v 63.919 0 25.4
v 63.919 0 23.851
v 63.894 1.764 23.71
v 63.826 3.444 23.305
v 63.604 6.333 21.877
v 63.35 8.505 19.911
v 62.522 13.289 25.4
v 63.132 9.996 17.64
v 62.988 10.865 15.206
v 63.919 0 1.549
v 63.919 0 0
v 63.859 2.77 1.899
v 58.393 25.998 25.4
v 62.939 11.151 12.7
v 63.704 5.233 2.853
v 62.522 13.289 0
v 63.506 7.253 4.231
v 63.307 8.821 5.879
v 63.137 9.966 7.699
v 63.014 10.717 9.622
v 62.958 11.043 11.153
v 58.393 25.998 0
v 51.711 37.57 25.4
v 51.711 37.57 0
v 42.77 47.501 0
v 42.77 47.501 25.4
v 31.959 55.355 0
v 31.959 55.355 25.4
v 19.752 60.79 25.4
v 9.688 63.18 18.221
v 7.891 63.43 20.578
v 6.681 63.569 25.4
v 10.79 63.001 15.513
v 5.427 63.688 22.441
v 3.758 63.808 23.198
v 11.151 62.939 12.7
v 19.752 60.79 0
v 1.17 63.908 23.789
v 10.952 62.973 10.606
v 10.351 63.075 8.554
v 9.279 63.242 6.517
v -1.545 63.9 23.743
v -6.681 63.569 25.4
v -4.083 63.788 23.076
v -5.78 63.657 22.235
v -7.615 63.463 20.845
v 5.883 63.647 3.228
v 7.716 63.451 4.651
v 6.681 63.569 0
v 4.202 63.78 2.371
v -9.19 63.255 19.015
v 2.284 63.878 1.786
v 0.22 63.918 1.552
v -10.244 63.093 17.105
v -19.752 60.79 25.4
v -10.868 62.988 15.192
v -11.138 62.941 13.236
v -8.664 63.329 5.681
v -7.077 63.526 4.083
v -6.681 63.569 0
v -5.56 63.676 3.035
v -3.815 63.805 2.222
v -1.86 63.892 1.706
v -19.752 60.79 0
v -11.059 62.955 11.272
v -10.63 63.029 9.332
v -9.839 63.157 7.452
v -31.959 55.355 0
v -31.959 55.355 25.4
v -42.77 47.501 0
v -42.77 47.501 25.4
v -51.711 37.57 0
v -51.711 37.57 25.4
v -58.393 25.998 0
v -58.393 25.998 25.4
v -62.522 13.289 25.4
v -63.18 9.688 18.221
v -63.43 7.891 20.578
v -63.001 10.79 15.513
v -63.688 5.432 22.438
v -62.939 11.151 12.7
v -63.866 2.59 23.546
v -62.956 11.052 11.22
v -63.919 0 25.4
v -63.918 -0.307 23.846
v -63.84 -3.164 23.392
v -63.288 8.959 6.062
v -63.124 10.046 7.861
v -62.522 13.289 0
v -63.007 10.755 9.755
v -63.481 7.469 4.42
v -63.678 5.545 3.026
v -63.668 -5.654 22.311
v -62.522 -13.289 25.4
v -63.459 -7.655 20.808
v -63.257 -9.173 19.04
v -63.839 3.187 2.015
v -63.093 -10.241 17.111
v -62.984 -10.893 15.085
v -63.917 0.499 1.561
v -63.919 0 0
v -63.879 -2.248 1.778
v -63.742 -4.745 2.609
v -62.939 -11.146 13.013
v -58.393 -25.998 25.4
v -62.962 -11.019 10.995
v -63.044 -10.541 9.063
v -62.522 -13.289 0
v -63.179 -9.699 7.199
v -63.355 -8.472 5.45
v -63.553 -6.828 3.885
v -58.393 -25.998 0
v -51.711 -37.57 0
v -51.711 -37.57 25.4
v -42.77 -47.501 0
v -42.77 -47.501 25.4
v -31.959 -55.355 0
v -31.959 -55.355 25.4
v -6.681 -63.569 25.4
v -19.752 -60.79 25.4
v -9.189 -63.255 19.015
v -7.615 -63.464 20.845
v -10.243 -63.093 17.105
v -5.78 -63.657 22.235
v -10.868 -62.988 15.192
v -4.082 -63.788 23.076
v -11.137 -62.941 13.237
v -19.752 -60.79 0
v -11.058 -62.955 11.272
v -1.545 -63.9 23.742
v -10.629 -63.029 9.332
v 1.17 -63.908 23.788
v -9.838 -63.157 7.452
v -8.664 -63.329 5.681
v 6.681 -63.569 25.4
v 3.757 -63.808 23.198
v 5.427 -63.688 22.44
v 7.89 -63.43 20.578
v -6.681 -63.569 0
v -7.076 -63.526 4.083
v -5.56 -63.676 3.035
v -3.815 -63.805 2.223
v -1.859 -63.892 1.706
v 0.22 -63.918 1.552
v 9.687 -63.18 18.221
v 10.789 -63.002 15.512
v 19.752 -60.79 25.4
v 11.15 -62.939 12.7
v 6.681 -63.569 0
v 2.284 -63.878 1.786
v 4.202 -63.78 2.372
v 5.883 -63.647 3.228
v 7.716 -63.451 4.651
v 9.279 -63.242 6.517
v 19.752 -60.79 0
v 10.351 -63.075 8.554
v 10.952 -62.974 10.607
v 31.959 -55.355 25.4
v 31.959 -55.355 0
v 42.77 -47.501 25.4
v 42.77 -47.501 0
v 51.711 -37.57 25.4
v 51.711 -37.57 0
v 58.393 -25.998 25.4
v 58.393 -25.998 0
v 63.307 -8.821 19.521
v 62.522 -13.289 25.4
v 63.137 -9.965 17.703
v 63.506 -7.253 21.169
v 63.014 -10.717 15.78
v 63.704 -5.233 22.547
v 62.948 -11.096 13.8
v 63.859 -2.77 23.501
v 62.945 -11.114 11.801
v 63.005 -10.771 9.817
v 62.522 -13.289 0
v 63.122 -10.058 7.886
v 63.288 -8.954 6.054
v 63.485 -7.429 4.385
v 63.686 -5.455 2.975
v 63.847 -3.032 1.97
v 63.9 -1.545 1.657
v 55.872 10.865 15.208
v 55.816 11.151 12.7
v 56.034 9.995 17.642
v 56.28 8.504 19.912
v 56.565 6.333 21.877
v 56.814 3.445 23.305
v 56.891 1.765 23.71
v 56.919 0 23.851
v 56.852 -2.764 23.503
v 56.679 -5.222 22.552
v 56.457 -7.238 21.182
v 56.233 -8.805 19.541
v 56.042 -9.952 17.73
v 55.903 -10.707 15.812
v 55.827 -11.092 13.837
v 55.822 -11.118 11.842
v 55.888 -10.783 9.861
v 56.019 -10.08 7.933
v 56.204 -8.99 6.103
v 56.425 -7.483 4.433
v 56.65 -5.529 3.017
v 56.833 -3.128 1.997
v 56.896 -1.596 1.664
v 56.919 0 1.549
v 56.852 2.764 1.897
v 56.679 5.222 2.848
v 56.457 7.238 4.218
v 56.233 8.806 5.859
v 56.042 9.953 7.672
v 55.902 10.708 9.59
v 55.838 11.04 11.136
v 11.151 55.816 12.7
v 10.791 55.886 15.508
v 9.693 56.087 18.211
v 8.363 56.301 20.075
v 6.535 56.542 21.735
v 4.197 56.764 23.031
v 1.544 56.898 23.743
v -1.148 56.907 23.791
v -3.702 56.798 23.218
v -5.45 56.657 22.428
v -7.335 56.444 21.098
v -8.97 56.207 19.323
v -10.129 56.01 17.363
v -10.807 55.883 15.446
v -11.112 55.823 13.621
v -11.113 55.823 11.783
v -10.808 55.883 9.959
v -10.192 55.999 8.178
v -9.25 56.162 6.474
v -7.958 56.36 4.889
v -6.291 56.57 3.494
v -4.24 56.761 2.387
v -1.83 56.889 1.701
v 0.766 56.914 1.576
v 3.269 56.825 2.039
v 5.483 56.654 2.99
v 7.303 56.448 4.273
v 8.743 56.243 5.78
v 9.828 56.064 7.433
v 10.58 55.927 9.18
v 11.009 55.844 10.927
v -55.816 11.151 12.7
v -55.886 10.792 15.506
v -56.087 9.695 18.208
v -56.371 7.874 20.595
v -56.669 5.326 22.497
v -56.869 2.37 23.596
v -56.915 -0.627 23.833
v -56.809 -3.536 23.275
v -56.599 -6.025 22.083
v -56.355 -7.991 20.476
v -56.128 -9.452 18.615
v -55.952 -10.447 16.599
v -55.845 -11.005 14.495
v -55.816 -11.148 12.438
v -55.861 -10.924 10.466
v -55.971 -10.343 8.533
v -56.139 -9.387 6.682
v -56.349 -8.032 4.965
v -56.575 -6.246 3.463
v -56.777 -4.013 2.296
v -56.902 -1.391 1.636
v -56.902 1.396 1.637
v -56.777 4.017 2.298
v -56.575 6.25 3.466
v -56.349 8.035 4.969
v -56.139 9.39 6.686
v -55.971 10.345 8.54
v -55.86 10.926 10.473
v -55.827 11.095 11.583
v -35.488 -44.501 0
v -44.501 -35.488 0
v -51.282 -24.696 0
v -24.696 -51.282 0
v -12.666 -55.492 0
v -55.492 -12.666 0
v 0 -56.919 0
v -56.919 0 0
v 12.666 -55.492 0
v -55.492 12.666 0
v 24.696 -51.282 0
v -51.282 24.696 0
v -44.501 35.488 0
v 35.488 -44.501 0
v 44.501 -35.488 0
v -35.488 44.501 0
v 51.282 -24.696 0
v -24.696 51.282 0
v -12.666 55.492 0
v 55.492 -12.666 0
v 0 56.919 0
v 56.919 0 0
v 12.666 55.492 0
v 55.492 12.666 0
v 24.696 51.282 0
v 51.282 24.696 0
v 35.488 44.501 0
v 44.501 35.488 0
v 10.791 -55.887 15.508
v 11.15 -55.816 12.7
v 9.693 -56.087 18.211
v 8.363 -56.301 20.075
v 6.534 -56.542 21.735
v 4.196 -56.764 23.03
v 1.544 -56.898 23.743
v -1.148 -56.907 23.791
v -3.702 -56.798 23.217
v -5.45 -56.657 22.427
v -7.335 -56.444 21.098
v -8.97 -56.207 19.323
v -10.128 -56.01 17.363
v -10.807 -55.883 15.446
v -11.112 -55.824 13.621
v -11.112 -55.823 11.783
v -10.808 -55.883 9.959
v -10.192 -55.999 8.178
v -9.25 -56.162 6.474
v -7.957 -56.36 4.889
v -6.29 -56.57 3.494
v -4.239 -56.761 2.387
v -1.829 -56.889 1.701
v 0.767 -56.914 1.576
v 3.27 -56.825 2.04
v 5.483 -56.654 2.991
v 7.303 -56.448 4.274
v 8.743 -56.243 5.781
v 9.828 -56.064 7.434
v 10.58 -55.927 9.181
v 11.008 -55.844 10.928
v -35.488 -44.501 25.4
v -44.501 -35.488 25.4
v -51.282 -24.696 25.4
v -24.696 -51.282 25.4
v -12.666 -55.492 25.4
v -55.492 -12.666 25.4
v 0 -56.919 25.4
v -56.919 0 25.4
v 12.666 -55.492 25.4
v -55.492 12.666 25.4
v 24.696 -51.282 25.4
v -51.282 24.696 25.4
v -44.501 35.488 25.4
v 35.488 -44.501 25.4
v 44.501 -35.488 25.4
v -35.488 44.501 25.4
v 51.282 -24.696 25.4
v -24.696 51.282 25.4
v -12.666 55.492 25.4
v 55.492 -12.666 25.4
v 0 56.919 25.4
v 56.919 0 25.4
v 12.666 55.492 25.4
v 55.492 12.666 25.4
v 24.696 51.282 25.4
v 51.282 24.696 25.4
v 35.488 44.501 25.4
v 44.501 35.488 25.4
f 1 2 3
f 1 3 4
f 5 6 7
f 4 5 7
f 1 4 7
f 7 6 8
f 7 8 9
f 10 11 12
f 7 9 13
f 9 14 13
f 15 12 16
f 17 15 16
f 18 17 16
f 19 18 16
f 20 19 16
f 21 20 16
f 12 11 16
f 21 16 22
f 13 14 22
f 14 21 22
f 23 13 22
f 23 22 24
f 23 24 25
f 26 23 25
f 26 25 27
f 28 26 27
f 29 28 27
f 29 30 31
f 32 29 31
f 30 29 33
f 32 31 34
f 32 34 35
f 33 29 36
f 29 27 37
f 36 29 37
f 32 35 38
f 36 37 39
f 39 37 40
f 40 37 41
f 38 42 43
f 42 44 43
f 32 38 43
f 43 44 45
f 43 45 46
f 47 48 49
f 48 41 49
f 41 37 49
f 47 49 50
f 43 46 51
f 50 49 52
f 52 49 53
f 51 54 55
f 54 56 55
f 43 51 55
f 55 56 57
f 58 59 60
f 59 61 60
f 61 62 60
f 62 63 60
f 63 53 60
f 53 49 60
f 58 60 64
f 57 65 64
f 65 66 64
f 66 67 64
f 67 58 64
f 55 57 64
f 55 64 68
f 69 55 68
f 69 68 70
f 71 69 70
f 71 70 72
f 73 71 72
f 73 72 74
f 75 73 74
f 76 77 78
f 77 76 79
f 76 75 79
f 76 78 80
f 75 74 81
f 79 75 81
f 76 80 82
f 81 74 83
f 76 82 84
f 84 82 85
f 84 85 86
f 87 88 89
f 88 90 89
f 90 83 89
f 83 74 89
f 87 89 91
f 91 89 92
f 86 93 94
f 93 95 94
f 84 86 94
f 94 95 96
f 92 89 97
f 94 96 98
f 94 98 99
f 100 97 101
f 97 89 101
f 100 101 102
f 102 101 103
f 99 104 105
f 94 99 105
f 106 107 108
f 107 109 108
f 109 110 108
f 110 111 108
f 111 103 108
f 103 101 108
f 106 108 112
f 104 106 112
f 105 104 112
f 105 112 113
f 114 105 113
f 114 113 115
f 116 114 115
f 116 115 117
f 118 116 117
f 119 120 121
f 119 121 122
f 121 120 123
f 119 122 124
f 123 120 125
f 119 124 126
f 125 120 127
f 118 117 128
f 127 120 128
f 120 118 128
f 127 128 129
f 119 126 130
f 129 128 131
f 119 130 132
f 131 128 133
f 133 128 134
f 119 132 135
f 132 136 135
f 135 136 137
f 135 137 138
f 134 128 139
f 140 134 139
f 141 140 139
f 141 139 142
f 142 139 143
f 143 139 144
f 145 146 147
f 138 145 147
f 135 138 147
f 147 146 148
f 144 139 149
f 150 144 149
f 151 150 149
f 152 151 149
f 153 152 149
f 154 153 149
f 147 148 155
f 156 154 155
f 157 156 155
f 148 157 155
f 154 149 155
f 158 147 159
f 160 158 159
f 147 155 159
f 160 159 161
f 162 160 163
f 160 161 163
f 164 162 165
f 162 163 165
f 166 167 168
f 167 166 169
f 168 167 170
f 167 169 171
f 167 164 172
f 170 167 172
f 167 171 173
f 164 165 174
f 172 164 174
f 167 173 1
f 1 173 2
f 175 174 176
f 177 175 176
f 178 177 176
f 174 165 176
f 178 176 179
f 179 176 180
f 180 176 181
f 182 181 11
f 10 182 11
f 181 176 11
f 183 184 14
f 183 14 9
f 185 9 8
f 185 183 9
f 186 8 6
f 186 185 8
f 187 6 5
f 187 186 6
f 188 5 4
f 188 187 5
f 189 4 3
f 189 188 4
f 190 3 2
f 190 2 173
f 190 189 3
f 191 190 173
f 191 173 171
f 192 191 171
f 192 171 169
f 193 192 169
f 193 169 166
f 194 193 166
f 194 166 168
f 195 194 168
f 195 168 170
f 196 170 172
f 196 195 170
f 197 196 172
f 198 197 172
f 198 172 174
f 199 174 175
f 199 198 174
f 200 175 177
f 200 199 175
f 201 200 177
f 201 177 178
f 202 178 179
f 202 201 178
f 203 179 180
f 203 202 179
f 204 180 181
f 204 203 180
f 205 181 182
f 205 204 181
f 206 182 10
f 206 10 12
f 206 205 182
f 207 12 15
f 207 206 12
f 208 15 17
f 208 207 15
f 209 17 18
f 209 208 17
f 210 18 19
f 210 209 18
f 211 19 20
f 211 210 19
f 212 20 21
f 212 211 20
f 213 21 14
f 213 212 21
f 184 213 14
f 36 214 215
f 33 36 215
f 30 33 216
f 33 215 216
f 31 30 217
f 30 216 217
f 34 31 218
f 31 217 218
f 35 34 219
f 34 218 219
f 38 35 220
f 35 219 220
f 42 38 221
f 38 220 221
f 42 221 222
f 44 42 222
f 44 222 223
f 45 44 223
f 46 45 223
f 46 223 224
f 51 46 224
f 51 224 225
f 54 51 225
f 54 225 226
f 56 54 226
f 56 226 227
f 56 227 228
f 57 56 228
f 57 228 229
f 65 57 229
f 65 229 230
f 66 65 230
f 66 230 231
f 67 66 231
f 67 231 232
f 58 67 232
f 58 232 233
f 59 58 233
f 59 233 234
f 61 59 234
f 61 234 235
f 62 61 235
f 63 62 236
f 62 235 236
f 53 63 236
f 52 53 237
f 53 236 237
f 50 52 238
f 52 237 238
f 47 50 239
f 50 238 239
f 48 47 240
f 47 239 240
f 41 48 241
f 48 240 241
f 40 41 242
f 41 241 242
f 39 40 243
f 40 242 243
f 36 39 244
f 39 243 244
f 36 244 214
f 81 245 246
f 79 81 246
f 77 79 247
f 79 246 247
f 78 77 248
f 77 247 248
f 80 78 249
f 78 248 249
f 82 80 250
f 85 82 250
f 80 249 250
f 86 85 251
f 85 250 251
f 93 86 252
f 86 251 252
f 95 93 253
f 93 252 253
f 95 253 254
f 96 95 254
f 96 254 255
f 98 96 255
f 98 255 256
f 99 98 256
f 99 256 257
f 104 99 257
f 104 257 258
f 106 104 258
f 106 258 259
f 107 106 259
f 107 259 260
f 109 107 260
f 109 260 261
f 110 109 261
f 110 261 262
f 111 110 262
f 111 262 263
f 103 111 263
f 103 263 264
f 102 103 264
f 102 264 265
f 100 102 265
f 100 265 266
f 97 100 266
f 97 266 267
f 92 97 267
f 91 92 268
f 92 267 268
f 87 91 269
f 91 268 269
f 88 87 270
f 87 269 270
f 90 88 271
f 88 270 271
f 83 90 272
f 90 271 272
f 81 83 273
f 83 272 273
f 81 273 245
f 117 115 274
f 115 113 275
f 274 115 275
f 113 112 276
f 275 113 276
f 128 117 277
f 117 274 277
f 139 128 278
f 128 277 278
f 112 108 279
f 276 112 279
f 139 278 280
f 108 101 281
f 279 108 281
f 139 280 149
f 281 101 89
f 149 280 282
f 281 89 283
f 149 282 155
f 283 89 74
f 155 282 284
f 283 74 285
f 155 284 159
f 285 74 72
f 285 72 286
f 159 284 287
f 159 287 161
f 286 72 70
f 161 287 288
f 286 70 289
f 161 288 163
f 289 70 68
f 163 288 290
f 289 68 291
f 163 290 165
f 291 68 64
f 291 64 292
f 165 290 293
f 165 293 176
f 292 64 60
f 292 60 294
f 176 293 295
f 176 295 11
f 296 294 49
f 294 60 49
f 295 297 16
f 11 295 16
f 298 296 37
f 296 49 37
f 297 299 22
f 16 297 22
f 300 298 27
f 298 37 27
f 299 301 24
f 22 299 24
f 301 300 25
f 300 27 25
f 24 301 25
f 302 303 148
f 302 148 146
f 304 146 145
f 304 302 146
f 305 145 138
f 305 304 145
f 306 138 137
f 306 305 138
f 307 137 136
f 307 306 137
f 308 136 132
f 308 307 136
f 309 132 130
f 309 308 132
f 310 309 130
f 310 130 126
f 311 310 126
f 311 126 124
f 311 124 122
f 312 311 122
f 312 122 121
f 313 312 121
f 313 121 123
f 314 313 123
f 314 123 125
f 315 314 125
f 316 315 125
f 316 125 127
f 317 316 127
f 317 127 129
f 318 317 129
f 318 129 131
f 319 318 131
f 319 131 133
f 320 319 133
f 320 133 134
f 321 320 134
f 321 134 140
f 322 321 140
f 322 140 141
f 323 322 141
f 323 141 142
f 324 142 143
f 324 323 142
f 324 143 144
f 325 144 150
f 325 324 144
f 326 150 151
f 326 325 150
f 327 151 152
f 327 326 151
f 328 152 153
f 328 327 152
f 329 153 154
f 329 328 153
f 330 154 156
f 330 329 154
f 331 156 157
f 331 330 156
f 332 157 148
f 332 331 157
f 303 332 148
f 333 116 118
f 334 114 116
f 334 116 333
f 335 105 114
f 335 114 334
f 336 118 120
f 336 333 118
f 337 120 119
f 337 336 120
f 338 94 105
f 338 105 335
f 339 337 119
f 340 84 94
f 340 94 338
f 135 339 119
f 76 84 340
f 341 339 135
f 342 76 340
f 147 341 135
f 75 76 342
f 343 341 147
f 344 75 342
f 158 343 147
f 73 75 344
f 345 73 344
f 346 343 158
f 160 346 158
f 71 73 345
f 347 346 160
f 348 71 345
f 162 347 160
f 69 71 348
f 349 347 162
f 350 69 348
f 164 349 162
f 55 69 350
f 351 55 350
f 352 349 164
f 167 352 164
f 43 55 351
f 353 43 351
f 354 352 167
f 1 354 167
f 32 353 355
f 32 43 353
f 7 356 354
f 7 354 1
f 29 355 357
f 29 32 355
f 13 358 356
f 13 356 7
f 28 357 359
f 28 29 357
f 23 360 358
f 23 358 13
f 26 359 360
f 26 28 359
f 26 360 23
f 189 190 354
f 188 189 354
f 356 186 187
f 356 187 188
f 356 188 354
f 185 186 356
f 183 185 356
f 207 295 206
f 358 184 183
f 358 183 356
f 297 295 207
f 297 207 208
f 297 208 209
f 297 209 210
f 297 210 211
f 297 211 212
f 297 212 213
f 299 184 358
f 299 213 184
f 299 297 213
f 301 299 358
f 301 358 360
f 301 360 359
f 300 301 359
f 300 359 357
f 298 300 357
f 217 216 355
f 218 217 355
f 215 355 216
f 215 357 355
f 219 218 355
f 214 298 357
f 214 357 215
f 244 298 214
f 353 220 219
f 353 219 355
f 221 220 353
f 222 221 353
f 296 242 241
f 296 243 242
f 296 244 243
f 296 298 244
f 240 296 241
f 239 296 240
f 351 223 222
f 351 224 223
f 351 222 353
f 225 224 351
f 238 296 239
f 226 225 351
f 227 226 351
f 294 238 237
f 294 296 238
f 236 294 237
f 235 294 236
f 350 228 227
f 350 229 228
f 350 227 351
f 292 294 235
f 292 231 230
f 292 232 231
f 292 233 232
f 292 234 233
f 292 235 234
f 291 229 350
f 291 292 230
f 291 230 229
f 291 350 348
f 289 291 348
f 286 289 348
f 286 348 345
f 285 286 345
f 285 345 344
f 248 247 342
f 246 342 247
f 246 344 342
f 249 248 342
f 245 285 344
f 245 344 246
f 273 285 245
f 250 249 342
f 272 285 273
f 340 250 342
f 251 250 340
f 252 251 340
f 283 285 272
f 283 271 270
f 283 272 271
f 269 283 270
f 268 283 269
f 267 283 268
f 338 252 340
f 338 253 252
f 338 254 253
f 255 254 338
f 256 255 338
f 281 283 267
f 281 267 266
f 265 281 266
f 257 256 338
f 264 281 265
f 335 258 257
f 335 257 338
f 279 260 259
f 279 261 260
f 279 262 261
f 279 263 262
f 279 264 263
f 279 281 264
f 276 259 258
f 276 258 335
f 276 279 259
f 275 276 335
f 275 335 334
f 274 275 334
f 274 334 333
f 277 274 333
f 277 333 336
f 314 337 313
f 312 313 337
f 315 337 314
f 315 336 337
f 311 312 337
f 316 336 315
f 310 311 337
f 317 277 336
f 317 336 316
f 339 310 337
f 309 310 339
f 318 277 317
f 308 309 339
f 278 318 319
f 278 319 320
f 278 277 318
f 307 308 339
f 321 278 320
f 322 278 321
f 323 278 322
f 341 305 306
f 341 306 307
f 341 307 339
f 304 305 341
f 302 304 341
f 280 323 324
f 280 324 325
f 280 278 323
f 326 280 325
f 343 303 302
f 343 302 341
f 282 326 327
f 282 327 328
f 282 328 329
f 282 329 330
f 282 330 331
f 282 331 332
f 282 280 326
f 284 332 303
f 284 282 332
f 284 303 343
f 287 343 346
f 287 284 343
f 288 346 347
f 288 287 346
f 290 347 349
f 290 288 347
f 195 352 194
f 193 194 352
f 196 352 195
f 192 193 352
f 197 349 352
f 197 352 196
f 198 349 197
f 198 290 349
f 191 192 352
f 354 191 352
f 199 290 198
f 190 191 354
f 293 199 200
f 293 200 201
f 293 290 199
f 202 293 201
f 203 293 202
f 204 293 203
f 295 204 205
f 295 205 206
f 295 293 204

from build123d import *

# Parameters (mm, degrees)
F0_R     = 63.918721
F0_R_2   = 56.918721
F1_DEPTH = 25.4
F2_R     = 11.15
F3_DEPTH = 76.2
F4_R     = 11.1506
F5_DEPTH = 76.2
F6_R     = 11.1506
F7_DEPTH = 76.2
F8_R     = 11.1506
F9_DEPTH = 76.2


with BuildPart() as f1:
    # F0 (on Top) → F1 (new body)
    with BuildSketch(Plane.XY):
        Circle(F0_R)
        Circle(F0_R_2, mode=Mode.SUBTRACT)
    extrude(amount=F1_DEPTH)

    # F2 (on Front) → F3 (cut)
    with BuildSketch(Plane.XZ):
        with Locations((0, 12.7)):
            Circle(F2_R)
    extrude(amount=F3_DEPTH, mode=Mode.SUBTRACT)

    # F4 (on Front) → F5 (cut)
    with BuildSketch(Plane.XZ):
        with Locations((0, 12.7)):
            Circle(F4_R)
    extrude(amount=-F5_DEPTH, mode=Mode.SUBTRACT)

    # F6 (on Right) → F7 (cut)
    with BuildSketch(Plane.YZ):
        with Locations((0, 12.7)):
            Circle(F6_R)
    extrude(amount=-F7_DEPTH, mode=Mode.SUBTRACT)

    # F8 (on Right) → F9 (cut)
    with BuildSketch(Plane.YZ):
        with Locations((0, 12.7)):
            Circle(F8_R)
    extrude(amount=F9_DEPTH, mode=Mode.SUBTRACT)


solid = f1.part
